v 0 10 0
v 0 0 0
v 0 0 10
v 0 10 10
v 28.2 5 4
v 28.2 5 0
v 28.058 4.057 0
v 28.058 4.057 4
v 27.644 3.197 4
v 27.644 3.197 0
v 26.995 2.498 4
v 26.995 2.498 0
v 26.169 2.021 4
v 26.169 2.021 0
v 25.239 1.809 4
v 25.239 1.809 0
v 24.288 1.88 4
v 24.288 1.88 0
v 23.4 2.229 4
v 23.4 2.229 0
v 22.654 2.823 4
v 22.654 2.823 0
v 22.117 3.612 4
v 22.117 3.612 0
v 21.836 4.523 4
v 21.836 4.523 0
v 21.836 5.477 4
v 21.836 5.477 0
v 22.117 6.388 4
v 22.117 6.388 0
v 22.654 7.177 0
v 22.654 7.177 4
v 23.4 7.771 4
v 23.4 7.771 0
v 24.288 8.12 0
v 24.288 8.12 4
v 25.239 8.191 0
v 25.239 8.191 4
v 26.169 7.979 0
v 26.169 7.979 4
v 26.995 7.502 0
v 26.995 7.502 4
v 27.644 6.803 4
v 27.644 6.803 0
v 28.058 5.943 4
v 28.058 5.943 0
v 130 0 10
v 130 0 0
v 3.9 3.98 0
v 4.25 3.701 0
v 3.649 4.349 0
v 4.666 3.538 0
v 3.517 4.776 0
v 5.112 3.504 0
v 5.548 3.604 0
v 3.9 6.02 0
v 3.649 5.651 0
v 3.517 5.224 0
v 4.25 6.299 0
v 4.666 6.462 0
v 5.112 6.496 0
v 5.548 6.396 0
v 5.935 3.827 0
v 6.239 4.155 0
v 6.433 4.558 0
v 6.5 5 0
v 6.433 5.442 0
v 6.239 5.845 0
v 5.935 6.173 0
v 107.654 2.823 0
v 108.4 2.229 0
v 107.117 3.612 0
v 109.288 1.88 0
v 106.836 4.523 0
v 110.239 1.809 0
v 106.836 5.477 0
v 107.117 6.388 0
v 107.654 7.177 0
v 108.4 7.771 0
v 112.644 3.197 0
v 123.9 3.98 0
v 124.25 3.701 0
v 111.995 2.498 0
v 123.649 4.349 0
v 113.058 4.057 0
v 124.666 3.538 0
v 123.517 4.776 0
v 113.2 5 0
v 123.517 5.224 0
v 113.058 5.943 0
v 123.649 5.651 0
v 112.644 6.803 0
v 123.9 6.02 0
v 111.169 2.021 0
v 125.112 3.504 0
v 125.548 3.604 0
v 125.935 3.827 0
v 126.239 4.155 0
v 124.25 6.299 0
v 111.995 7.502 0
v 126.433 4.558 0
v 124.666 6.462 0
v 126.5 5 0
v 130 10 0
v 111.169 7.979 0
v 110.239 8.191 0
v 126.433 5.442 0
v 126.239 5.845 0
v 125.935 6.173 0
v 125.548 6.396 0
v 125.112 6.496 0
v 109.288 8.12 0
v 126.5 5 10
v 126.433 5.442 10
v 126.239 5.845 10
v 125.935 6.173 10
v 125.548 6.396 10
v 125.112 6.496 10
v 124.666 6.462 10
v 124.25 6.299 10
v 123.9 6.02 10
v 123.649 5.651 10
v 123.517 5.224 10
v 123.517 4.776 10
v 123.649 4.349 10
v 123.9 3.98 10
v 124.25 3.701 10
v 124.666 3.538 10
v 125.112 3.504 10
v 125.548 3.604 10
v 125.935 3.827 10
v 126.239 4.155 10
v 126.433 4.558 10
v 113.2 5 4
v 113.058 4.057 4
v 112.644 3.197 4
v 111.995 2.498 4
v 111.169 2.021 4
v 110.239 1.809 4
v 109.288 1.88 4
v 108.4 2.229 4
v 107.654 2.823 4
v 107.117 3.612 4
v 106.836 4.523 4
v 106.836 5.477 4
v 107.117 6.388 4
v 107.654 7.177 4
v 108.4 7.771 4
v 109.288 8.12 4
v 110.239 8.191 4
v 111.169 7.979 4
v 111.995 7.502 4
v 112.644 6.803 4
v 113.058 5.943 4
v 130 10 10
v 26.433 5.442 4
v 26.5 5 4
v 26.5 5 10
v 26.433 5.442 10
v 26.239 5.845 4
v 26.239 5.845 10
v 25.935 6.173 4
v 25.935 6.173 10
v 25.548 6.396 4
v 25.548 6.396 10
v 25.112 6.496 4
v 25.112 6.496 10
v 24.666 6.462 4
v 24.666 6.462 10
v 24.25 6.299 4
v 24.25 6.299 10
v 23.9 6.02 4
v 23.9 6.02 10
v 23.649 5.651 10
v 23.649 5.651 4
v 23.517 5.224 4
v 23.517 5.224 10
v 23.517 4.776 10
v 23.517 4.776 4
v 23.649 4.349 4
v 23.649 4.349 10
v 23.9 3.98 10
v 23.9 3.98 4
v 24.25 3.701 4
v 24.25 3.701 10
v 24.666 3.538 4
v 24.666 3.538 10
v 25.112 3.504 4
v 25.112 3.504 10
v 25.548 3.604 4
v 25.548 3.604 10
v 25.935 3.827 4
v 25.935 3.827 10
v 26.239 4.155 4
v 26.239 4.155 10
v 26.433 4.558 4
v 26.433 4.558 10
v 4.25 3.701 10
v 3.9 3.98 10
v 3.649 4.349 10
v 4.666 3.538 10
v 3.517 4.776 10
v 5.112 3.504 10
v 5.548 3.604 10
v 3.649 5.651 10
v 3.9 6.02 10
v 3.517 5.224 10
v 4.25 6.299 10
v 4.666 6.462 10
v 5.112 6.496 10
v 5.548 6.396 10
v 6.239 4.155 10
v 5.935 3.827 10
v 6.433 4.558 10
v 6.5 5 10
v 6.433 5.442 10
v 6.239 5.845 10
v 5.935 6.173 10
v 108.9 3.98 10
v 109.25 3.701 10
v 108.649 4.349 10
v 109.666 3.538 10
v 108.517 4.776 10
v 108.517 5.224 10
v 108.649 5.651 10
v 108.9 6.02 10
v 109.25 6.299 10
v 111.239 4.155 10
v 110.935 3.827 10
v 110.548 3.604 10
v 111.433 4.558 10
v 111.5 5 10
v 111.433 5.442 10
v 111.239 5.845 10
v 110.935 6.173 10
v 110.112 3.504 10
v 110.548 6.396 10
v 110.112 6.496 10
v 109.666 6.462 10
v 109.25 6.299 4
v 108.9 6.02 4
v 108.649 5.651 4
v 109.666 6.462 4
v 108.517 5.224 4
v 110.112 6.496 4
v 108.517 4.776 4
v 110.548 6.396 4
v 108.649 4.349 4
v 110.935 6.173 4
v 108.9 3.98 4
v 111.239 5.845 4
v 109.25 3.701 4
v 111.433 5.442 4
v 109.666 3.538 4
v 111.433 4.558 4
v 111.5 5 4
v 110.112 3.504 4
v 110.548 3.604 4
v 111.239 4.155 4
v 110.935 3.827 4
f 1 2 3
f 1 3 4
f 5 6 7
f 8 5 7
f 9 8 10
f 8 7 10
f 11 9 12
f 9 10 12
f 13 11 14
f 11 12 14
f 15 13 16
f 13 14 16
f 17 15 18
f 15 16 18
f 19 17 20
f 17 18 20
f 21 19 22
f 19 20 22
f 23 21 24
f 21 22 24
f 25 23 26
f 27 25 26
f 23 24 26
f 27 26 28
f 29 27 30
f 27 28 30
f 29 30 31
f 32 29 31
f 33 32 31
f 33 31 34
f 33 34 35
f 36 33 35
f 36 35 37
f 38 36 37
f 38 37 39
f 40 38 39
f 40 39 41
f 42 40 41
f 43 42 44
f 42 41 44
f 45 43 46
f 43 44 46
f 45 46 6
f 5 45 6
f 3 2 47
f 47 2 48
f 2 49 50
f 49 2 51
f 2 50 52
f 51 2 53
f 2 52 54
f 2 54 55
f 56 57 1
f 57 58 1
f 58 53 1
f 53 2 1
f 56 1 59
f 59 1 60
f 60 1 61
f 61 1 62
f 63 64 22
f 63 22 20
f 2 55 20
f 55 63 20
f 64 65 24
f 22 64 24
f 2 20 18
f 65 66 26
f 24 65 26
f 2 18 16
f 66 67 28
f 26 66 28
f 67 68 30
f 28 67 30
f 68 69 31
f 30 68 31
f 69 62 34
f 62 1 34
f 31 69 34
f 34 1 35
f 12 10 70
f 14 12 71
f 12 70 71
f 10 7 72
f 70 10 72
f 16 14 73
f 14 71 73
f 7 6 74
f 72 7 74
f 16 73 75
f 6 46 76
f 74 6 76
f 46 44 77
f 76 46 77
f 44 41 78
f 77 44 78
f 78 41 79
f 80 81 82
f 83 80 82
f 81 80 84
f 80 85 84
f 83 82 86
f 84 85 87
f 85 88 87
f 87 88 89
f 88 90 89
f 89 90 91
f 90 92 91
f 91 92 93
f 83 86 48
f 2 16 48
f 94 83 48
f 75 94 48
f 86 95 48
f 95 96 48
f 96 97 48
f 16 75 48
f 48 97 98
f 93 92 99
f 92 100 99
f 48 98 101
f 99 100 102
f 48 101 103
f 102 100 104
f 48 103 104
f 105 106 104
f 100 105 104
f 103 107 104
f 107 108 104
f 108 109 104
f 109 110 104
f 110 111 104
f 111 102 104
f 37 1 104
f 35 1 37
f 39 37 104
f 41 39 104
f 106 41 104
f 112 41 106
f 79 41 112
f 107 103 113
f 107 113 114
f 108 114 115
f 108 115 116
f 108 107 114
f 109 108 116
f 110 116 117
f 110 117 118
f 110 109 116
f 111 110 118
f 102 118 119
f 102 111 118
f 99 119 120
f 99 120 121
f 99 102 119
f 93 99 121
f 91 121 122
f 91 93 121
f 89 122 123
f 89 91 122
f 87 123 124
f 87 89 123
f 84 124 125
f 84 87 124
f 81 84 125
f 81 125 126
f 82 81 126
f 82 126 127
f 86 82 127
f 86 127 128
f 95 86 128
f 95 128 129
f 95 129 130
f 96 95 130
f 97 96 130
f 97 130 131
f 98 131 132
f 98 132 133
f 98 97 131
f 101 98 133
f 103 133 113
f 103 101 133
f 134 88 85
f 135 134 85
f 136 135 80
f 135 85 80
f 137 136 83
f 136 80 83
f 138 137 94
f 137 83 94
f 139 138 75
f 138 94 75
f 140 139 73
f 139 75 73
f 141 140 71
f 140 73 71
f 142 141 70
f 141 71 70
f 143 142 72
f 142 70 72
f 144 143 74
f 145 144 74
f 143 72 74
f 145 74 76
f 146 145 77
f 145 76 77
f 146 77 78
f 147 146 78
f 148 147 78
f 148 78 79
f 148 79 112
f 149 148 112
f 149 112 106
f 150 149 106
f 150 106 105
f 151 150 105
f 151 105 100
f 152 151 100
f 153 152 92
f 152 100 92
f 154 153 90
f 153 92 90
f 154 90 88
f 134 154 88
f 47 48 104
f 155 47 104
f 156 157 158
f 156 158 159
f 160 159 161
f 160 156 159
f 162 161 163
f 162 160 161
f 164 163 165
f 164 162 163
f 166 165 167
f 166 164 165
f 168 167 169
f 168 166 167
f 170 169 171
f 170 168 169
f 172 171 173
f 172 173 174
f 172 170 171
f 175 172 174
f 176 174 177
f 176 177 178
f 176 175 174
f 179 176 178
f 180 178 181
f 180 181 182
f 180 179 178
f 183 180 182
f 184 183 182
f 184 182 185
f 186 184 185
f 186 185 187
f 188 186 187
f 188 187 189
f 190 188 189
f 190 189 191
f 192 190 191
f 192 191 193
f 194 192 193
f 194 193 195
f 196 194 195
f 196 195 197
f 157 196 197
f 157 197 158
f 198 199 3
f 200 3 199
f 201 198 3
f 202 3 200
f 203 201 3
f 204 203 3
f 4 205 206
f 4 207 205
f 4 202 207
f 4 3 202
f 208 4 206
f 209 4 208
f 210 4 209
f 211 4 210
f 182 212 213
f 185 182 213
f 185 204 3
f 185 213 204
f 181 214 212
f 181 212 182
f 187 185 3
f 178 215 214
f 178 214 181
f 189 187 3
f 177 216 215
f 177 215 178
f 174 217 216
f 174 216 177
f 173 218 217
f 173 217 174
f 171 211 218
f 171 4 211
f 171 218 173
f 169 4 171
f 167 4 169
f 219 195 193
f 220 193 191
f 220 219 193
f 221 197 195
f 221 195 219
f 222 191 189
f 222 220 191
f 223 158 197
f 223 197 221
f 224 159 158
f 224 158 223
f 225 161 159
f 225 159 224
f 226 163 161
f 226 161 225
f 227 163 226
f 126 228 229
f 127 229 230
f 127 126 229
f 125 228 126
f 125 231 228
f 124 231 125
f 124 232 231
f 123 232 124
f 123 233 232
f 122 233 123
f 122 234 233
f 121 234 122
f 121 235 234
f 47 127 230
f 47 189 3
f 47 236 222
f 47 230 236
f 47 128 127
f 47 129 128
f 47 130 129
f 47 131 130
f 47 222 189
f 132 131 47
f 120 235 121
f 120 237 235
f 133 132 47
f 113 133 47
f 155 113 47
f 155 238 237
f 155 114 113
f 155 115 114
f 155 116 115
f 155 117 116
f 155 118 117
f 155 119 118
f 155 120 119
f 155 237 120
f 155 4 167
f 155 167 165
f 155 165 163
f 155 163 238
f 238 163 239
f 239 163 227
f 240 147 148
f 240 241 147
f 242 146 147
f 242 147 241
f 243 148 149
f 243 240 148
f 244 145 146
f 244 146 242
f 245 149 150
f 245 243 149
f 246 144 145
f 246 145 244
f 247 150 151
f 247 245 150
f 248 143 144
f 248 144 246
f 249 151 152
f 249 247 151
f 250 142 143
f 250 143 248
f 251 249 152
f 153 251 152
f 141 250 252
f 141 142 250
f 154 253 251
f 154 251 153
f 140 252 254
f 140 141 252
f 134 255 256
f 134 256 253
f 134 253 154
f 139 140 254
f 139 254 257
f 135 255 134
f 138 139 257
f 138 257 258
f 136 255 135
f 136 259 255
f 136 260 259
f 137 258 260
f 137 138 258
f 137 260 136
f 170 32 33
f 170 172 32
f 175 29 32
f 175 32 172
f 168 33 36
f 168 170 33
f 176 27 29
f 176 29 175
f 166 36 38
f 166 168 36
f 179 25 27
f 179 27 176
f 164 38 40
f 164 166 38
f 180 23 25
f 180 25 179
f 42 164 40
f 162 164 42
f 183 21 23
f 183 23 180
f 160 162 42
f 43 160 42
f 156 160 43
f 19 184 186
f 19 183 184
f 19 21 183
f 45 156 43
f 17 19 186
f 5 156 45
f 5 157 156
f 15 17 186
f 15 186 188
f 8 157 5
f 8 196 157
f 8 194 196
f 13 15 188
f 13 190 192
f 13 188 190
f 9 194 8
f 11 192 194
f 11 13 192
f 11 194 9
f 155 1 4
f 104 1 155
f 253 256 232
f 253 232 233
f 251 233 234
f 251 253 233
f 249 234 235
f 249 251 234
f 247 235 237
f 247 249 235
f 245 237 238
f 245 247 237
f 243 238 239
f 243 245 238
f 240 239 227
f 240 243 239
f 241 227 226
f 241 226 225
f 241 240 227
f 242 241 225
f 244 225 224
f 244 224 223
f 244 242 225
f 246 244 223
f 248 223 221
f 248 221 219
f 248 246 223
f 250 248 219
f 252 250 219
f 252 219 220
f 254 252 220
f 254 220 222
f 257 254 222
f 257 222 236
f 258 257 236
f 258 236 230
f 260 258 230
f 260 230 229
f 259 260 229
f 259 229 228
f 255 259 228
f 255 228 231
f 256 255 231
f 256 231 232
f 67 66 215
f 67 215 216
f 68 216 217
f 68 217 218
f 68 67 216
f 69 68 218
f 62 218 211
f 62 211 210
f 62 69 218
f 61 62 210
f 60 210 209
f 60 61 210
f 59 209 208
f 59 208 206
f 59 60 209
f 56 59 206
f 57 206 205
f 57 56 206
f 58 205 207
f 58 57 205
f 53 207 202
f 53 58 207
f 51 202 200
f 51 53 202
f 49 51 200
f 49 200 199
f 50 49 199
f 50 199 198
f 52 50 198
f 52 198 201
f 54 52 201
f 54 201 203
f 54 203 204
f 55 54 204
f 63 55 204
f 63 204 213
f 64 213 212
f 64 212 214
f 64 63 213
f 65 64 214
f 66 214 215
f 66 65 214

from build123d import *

# Parameters (mm, degrees)
SKETCH_W     = 130
SKETCH_H     = 10
SKETCH_R     = 1.5
PAD_DEPTH    = 10
SKETCH001_R  = 3.2
POCKET_DEPTH = 4


with BuildPart() as part:
    # Sketch → Pad (new body)
    with BuildSketch(Plane.XY):
        with Locations((65, 5)):
            Rectangle(SKETCH_W, SKETCH_H)
        with Locations((5, 5)):
            Circle(SKETCH_R, mode=Mode.SUBTRACT)
        with Locations((25, 5)):
            Circle(SKETCH_R, mode=Mode.SUBTRACT)
        with Locations((125, 5)):
            Circle(SKETCH_R, mode=Mode.SUBTRACT)
        with Locations((110, 5)):
            Circle(SKETCH_R, mode=Mode.SUBTRACT)
    extrude(amount=PAD_DEPTH)

    # Sketch001 (on Face9 of Pad) → Pocket (cut)
    with BuildSketch(Plane(origin=(0, 0, 0), x_dir=(1, 0, 0), z_dir=(0, 0, -1))):
        with Locations((25, -5)):
            Circle(SKETCH001_R)
        with Locations((110, -5)):
            Circle(SKETCH001_R)
    extrude(amount=-POCKET_DEPTH, mode=Mode.SUBTRACT)


solid = part.part
